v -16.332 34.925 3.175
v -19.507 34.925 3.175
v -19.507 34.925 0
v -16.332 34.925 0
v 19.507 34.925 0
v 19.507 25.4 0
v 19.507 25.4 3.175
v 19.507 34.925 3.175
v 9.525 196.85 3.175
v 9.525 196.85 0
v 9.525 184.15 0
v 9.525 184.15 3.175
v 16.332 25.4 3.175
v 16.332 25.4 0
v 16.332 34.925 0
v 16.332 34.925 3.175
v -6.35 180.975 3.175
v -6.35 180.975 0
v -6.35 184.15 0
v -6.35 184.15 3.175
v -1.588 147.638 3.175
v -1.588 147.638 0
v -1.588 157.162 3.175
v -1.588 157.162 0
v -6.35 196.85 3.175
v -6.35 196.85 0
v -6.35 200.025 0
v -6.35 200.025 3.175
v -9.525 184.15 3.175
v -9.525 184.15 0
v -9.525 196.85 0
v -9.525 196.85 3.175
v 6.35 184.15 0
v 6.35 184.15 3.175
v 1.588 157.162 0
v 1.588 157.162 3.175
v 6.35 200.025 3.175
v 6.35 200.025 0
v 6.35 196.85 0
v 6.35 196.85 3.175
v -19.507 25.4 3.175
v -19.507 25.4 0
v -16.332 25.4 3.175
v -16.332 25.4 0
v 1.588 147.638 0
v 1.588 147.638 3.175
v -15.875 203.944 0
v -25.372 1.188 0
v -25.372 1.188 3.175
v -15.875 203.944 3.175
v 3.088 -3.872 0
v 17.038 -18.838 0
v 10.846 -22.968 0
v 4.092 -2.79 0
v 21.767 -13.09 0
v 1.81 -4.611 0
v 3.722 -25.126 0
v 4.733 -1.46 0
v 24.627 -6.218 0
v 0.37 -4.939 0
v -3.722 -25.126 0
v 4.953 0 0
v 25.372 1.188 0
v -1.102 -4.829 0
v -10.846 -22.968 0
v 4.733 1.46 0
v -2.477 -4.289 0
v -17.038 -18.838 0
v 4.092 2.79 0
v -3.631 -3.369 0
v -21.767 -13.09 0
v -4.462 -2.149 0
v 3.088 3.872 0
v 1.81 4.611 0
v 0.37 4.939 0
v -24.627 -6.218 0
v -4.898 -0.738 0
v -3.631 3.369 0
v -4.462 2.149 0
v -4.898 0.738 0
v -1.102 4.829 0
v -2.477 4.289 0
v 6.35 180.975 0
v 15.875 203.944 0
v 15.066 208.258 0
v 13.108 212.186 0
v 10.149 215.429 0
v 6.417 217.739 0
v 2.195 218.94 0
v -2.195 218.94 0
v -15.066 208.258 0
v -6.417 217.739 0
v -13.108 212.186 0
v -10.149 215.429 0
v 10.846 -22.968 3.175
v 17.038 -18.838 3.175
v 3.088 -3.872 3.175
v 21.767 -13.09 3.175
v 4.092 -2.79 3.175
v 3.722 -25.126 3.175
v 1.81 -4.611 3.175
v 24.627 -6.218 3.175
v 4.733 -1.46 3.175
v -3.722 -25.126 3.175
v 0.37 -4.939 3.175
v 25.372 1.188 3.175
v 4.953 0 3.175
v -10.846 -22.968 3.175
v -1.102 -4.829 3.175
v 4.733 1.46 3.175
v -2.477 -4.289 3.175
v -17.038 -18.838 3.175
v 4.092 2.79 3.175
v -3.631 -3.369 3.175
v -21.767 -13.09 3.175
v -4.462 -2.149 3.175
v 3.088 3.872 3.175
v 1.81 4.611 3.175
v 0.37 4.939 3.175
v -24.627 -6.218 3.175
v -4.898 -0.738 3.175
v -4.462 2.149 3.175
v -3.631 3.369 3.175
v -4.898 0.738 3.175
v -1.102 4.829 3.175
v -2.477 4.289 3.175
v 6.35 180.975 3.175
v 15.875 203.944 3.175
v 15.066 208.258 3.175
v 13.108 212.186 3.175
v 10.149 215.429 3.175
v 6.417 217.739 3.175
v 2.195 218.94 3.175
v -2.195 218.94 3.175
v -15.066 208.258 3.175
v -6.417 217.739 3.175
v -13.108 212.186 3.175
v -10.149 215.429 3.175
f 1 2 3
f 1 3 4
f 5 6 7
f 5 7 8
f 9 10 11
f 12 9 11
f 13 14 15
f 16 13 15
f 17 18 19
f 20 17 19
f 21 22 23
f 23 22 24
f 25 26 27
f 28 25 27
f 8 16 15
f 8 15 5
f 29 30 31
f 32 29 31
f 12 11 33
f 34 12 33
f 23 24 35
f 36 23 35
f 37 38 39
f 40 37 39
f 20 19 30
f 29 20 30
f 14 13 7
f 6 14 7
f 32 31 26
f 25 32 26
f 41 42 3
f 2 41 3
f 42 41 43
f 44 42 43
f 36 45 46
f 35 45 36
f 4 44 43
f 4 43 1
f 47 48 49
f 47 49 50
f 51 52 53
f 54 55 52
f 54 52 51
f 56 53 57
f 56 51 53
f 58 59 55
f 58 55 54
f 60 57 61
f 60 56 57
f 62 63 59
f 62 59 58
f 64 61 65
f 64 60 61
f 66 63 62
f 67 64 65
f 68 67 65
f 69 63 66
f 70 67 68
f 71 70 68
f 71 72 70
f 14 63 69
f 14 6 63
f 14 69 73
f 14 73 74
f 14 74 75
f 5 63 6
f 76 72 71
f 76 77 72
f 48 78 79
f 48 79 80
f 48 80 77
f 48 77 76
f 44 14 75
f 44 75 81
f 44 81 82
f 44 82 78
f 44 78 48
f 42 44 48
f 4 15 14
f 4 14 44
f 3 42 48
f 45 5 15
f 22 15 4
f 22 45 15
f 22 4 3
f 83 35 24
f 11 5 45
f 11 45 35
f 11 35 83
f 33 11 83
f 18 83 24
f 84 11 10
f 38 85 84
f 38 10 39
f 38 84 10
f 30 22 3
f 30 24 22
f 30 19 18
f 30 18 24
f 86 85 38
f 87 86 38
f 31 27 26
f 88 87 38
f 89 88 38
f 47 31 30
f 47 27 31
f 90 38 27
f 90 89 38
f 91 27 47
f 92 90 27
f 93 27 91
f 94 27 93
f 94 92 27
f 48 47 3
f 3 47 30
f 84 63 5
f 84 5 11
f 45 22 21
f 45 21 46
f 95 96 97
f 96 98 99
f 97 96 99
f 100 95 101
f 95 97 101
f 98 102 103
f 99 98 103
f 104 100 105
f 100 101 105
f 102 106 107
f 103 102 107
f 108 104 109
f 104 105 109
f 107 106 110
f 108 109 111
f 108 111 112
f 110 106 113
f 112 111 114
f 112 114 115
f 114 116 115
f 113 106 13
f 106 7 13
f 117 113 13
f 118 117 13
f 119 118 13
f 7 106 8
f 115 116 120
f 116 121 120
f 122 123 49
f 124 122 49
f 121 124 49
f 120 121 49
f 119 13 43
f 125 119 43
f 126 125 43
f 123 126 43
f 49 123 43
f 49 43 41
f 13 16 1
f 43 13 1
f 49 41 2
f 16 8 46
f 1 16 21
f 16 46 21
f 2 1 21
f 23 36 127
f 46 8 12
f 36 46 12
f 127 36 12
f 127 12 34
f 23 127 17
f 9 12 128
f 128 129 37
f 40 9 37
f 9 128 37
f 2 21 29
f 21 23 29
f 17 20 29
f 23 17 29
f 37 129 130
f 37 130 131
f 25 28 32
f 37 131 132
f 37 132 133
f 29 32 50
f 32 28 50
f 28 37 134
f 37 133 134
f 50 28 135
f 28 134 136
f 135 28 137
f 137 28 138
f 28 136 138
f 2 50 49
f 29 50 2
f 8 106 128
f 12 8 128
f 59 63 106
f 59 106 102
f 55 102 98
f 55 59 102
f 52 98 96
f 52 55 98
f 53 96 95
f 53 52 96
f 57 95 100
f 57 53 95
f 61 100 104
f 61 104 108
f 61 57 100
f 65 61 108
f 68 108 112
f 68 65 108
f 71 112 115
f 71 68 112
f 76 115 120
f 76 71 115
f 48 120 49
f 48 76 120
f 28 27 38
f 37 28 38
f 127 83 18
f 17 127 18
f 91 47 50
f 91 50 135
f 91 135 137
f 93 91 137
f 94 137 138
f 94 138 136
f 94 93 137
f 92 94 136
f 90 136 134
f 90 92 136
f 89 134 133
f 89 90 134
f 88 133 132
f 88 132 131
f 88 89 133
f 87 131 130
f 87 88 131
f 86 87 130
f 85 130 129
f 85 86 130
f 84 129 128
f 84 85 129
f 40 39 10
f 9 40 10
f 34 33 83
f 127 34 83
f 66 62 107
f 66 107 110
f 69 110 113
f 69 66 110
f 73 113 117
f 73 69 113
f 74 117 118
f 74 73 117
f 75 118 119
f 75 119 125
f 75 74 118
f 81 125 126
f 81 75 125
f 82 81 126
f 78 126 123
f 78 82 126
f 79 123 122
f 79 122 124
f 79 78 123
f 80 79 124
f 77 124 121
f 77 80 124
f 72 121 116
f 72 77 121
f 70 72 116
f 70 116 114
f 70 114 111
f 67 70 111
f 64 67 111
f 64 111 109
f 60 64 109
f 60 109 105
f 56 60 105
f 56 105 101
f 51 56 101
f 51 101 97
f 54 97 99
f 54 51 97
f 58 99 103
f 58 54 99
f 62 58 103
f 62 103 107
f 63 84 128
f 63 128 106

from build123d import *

# Parameters (mm, degrees)
SKETCH1_R           = 4.953
SKETCH1_W           = 3.175
SKETCH1_H           = 9.525
BOSS_EXTRUDE1_DEPTH = 3.175


with BuildPart() as part:
    # Sketch1 → Boss-Extrude1 (new body)
    with BuildSketch(Plane.XY):
        with BuildLine():
            Line((-25.372181386, 1.188449288), (-15.875, 203.943595206))
            ThreePointArc((-15.875, 203.943595206), (0, 219.092405697), (15.875, 203.943595206))
            Line((15.875, 203.943595206), (25.372181386, 1.188449288))
            ThreePointArc((25.372181386, 1.188449288), (0, -25.4), (-25.372181386, 1.188449288))
        make_face()
        Circle(SKETCH1_R, mode=Mode.SUBTRACT)
        Polygon((-6.35, 200.025), (6.35, 200.025), (6.35, 196.85), (9.525, 196.85), (9.525, 184.15), (6.35, 184.15), (6.35, 180.975), (-6.35, 180.975), (-6.35, 184.15), (-9.525, 184.15), (-9.525, 196.85), (-6.35, 196.85), align=None, mode=Mode.SUBTRACT)
        with Locations((-17.9197, 30.1625)):
            Rectangle(SKETCH1_W, SKETCH1_H, mode=Mode.SUBTRACT)
        with Locations((0, 152.4)):
            Rectangle(SKETCH1_W, SKETCH1_H, mode=Mode.SUBTRACT)
        with Locations((17.9197, 30.1625)):
            Rectangle(SKETCH1_W, SKETCH1_H, mode=Mode.SUBTRACT)
    extrude(amount=BOSS_EXTRUDE1_DEPTH)


solid = part.part
